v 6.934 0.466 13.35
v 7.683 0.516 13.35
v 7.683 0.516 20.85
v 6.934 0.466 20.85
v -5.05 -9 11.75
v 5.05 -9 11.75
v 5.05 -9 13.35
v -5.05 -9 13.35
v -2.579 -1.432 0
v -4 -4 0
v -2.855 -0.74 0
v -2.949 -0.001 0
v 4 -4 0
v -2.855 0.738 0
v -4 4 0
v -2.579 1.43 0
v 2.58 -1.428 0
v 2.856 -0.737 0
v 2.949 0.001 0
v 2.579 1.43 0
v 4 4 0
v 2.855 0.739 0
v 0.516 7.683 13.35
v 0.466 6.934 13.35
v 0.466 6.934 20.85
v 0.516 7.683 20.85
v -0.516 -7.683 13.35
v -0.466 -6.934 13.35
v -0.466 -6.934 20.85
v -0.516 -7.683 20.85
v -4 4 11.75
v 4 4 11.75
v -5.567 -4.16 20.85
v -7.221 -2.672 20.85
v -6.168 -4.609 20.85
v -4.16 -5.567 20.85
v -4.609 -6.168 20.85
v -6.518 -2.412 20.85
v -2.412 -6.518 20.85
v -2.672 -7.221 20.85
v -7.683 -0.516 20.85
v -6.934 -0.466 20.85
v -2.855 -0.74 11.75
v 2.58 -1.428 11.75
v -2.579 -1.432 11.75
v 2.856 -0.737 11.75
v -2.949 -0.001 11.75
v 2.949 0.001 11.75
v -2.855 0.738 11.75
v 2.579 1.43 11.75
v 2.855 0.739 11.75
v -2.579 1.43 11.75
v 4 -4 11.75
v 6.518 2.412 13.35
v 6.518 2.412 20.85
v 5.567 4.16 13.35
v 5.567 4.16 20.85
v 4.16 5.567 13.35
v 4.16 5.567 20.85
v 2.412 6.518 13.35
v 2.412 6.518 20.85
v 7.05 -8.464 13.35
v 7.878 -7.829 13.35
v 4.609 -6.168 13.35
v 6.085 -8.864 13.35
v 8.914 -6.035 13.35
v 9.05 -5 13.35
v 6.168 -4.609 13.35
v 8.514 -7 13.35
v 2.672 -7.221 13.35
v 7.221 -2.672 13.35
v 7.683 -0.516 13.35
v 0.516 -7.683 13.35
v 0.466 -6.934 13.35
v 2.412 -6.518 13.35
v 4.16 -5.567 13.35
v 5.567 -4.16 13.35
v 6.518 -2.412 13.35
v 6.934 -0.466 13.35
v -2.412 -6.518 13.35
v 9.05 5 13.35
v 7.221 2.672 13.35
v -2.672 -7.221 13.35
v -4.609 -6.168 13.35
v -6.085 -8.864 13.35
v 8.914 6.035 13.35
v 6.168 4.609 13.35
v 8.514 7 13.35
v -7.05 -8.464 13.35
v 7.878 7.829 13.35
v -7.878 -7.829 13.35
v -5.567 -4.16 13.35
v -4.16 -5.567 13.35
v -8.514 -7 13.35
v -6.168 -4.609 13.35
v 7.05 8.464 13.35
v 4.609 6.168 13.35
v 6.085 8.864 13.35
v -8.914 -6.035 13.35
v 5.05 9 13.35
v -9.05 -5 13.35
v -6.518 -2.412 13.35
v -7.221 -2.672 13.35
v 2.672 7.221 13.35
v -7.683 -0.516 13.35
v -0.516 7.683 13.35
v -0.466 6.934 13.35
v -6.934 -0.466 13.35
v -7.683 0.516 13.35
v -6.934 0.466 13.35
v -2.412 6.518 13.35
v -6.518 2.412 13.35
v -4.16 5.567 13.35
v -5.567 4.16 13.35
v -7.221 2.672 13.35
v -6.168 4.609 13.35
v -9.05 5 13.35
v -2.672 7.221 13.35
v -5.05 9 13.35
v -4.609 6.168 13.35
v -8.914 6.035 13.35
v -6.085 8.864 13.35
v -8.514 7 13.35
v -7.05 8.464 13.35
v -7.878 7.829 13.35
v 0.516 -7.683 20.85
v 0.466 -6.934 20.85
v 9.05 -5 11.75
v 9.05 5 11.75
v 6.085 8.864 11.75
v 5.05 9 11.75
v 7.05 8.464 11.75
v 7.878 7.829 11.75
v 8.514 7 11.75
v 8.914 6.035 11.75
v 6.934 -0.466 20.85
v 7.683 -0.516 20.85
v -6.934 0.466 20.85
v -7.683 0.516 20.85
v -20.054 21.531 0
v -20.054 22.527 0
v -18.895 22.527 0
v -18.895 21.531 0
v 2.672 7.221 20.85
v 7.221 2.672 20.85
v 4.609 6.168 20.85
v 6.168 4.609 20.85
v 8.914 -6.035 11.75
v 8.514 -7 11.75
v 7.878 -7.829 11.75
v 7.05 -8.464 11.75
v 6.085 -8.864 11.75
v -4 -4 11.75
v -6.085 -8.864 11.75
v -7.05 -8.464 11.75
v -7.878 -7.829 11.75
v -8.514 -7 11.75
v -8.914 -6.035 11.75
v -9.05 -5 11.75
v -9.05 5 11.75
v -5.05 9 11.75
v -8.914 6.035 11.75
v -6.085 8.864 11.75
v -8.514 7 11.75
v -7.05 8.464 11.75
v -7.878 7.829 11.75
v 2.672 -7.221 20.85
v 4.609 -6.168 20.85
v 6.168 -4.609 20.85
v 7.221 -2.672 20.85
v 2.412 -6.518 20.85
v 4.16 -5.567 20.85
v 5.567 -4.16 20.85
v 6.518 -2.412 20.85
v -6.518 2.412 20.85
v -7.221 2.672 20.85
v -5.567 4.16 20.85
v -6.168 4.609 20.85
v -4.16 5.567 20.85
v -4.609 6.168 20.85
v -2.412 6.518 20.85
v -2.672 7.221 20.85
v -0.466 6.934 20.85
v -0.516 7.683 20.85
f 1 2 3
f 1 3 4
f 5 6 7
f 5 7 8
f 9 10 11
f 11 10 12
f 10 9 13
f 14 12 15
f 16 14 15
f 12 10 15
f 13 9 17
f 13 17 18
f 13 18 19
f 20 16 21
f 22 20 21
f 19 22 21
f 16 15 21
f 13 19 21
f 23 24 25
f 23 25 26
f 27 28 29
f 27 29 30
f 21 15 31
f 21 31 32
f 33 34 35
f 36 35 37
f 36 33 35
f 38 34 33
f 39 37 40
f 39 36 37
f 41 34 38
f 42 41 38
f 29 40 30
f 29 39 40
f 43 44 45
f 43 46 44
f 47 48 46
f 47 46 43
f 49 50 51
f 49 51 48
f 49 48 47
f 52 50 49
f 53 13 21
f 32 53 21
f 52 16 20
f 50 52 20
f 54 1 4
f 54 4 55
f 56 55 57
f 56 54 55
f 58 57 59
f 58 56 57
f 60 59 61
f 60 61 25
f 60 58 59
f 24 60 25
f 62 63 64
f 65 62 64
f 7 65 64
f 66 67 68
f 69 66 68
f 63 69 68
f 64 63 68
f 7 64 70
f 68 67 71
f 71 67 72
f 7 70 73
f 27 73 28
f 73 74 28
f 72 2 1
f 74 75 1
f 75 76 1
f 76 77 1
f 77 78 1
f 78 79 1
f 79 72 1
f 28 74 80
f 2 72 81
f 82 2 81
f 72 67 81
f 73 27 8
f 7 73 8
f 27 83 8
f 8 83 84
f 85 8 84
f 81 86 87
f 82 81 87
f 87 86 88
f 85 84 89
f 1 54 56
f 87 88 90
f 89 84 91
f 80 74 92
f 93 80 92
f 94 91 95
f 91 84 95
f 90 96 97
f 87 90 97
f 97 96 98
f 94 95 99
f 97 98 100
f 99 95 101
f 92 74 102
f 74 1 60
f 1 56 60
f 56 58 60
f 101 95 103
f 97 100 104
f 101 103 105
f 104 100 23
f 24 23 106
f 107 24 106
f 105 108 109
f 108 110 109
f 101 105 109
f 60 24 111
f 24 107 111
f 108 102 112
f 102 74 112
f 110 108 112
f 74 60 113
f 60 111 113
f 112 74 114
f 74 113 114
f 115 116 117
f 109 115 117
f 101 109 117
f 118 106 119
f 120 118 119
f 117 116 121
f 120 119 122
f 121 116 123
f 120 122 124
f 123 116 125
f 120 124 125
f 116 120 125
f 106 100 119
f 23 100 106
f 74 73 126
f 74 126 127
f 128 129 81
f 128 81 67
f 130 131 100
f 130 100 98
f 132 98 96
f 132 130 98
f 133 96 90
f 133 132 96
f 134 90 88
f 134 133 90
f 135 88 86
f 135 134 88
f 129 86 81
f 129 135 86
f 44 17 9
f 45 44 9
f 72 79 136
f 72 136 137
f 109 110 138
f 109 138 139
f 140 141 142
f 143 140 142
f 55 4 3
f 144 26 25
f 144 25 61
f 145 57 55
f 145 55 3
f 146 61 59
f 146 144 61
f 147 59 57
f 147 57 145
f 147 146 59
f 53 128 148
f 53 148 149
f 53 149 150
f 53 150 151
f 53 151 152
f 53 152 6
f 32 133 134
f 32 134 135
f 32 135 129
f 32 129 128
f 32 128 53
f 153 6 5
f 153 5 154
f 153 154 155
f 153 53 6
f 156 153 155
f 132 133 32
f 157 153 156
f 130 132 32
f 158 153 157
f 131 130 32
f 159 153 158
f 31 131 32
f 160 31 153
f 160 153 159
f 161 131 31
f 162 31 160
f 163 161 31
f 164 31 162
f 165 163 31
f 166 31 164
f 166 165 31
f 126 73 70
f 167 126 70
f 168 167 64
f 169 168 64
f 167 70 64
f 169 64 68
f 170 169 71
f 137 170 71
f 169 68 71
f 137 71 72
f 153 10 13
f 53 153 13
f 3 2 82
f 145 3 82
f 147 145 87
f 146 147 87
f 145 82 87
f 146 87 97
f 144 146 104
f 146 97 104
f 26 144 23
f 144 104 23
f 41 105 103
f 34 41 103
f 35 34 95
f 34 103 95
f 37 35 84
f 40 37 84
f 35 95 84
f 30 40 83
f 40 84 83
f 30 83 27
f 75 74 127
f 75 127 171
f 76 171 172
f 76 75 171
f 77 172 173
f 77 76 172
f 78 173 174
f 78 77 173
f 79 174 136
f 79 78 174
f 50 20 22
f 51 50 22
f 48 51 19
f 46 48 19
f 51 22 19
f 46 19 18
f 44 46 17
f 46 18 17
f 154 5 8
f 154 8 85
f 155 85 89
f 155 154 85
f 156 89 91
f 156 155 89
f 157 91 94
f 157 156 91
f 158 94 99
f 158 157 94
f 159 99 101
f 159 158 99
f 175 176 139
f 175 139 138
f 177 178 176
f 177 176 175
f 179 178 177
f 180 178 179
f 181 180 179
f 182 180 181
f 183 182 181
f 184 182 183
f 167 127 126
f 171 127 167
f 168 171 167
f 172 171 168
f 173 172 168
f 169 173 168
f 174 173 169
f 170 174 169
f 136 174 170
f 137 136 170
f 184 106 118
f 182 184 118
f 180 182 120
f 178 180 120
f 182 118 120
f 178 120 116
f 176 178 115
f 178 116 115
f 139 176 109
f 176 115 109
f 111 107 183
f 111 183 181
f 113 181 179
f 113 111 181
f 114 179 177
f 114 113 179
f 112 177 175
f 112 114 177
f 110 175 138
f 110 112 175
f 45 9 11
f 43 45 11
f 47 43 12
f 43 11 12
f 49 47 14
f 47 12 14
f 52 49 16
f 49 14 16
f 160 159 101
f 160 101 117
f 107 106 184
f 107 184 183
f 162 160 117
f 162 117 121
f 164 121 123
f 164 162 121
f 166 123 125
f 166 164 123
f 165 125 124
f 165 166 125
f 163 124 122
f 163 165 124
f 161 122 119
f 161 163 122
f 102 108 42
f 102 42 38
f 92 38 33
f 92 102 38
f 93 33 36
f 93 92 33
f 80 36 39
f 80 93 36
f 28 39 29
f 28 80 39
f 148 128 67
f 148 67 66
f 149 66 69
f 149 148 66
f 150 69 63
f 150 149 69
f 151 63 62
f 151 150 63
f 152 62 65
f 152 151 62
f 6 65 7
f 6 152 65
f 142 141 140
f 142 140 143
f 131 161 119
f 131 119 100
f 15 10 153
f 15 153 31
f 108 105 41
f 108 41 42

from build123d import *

# Parameters (mm, degrees)
SKETCH1_W           = 1.158652837
SKETCH1_H           = 0.996663238
BOSS_EXTRUDE1_DEPTH = 0.0005
SKETCH2_W           = 8
SKETCH2_H           = 8
BOSS_EXTRUDE2_DEPTH = 11.74993
BOSS_EXTRUDE3_DEPTH = 1.6
SKETCH4_R           = 7.7
BOSS_EXTRUDE4_DEPTH = 7.5
SKETCH5_R           = 6.95
CUT_EXTRUDE1_DEPTH  = 7.5
CUT_EXTRUDE2_DEPTH  = 7.5
CIRPATTERN1_COUNT   = 4


with BuildPart() as part:
    # Sketch1 → Boss-Extrude1 (new body)
    with BuildSketch(Plane.XY):
        with Locations((-19.474752995, 22.028941101)):
            Rectangle(SKETCH1_W, SKETCH1_H)
    extrude(amount=BOSS_EXTRUDE1_DEPTH)


with BuildPart() as body_2:
    # Sketch2 → Boss-Extrude2 (new body)
    with BuildSketch(Plane.XY):
        Rectangle(SKETCH2_W, SKETCH2_H)
        with BuildLine():
            Line((-2.579374981, 1.43), (2.579374981, 1.43))
            ThreePointArc((2.579374981, 1.43), (2.949249821, 0.000883851), (2.580231621, -1.428453735))
            Line((2.580231621, -1.428453735), (-2.578517414, -1.431545751))
            ThreePointArc((-2.578517414, -1.431545751), (-2.949249821, -0.000883851), (-2.579374981, 1.43))
        make_face(mode=Mode.SUBTRACT)
    extrude(amount=BOSS_EXTRUDE2_DEPTH)

    # Sketch3 → Boss-Extrude3 (add)
    with BuildSketch(Plane.XY.offset(11.74993)):
        with BuildLine():
            Line((-5.05, 9.000108401), (5.05, 9.000108401))
            ThreePointArc((5.05, 9.000108401), (7.878427125, 7.828535526), (9.05, 5.000108401))
            Line((9.05, 5.000108401), (9.05, -5.000108401))
            ThreePointArc((9.05, -5.000108401), (7.878427125, -7.828535526), (5.05, -9.000108401))
            Line((5.05, -9.000108401), (-5.05, -9.000108401))
            ThreePointArc((-5.05, -9.000108401), (-7.878427125, -7.828535526), (-9.05, -5.000108401))
            Line((-9.05, -5.000108401), (-9.05, 5.000108401))
            ThreePointArc((-9.05, 5.000108401), (-7.878427125, 7.828535526), (-5.05, 9.000108401))
        make_face()
    extrude(amount=BOSS_EXTRUDE3_DEPTH)

    # Sketch4 → Boss-Extrude4 (add)
    with BuildSketch(Plane.XY.offset(13.34993)):
        Circle(SKETCH4_R)
    extrude(amount=BOSS_EXTRUDE4_DEPTH)

    # Sketch5 → Cut-Extrude1 (cut)
    with BuildSketch(Plane.XY.offset(13.34993)):
        Circle(SKETCH5_R)
    extrude(amount=CUT_EXTRUDE1_DEPTH, mode=Mode.SUBTRACT)

    # Sketch11 → Cut-Extrude2 (cut)
    with BuildSketch(Plane.XY.offset(13.34993)):
        Polygon((0, 8.183776361), (-0.55, 8.183776361), (0, 0), (0.55, 8.183776361), align=None)
    cut_extrude2 = extrude(amount=CUT_EXTRUDE2_DEPTH, mode=Mode.SUBTRACT)

    # CirPattern1: Cut-Extrude2 ×4 about axis
    cirpattern1_axis = Axis((0, 0, 20.84993), (0, 0, -1))
    for i in range(1, CIRPATTERN1_COUNT):
        add(cut_extrude2.rotate(cirpattern1_axis, i * 360 / CIRPATTERN1_COUNT), mode=Mode.SUBTRACT)


solid = Compound([part.part, body_2.part])
